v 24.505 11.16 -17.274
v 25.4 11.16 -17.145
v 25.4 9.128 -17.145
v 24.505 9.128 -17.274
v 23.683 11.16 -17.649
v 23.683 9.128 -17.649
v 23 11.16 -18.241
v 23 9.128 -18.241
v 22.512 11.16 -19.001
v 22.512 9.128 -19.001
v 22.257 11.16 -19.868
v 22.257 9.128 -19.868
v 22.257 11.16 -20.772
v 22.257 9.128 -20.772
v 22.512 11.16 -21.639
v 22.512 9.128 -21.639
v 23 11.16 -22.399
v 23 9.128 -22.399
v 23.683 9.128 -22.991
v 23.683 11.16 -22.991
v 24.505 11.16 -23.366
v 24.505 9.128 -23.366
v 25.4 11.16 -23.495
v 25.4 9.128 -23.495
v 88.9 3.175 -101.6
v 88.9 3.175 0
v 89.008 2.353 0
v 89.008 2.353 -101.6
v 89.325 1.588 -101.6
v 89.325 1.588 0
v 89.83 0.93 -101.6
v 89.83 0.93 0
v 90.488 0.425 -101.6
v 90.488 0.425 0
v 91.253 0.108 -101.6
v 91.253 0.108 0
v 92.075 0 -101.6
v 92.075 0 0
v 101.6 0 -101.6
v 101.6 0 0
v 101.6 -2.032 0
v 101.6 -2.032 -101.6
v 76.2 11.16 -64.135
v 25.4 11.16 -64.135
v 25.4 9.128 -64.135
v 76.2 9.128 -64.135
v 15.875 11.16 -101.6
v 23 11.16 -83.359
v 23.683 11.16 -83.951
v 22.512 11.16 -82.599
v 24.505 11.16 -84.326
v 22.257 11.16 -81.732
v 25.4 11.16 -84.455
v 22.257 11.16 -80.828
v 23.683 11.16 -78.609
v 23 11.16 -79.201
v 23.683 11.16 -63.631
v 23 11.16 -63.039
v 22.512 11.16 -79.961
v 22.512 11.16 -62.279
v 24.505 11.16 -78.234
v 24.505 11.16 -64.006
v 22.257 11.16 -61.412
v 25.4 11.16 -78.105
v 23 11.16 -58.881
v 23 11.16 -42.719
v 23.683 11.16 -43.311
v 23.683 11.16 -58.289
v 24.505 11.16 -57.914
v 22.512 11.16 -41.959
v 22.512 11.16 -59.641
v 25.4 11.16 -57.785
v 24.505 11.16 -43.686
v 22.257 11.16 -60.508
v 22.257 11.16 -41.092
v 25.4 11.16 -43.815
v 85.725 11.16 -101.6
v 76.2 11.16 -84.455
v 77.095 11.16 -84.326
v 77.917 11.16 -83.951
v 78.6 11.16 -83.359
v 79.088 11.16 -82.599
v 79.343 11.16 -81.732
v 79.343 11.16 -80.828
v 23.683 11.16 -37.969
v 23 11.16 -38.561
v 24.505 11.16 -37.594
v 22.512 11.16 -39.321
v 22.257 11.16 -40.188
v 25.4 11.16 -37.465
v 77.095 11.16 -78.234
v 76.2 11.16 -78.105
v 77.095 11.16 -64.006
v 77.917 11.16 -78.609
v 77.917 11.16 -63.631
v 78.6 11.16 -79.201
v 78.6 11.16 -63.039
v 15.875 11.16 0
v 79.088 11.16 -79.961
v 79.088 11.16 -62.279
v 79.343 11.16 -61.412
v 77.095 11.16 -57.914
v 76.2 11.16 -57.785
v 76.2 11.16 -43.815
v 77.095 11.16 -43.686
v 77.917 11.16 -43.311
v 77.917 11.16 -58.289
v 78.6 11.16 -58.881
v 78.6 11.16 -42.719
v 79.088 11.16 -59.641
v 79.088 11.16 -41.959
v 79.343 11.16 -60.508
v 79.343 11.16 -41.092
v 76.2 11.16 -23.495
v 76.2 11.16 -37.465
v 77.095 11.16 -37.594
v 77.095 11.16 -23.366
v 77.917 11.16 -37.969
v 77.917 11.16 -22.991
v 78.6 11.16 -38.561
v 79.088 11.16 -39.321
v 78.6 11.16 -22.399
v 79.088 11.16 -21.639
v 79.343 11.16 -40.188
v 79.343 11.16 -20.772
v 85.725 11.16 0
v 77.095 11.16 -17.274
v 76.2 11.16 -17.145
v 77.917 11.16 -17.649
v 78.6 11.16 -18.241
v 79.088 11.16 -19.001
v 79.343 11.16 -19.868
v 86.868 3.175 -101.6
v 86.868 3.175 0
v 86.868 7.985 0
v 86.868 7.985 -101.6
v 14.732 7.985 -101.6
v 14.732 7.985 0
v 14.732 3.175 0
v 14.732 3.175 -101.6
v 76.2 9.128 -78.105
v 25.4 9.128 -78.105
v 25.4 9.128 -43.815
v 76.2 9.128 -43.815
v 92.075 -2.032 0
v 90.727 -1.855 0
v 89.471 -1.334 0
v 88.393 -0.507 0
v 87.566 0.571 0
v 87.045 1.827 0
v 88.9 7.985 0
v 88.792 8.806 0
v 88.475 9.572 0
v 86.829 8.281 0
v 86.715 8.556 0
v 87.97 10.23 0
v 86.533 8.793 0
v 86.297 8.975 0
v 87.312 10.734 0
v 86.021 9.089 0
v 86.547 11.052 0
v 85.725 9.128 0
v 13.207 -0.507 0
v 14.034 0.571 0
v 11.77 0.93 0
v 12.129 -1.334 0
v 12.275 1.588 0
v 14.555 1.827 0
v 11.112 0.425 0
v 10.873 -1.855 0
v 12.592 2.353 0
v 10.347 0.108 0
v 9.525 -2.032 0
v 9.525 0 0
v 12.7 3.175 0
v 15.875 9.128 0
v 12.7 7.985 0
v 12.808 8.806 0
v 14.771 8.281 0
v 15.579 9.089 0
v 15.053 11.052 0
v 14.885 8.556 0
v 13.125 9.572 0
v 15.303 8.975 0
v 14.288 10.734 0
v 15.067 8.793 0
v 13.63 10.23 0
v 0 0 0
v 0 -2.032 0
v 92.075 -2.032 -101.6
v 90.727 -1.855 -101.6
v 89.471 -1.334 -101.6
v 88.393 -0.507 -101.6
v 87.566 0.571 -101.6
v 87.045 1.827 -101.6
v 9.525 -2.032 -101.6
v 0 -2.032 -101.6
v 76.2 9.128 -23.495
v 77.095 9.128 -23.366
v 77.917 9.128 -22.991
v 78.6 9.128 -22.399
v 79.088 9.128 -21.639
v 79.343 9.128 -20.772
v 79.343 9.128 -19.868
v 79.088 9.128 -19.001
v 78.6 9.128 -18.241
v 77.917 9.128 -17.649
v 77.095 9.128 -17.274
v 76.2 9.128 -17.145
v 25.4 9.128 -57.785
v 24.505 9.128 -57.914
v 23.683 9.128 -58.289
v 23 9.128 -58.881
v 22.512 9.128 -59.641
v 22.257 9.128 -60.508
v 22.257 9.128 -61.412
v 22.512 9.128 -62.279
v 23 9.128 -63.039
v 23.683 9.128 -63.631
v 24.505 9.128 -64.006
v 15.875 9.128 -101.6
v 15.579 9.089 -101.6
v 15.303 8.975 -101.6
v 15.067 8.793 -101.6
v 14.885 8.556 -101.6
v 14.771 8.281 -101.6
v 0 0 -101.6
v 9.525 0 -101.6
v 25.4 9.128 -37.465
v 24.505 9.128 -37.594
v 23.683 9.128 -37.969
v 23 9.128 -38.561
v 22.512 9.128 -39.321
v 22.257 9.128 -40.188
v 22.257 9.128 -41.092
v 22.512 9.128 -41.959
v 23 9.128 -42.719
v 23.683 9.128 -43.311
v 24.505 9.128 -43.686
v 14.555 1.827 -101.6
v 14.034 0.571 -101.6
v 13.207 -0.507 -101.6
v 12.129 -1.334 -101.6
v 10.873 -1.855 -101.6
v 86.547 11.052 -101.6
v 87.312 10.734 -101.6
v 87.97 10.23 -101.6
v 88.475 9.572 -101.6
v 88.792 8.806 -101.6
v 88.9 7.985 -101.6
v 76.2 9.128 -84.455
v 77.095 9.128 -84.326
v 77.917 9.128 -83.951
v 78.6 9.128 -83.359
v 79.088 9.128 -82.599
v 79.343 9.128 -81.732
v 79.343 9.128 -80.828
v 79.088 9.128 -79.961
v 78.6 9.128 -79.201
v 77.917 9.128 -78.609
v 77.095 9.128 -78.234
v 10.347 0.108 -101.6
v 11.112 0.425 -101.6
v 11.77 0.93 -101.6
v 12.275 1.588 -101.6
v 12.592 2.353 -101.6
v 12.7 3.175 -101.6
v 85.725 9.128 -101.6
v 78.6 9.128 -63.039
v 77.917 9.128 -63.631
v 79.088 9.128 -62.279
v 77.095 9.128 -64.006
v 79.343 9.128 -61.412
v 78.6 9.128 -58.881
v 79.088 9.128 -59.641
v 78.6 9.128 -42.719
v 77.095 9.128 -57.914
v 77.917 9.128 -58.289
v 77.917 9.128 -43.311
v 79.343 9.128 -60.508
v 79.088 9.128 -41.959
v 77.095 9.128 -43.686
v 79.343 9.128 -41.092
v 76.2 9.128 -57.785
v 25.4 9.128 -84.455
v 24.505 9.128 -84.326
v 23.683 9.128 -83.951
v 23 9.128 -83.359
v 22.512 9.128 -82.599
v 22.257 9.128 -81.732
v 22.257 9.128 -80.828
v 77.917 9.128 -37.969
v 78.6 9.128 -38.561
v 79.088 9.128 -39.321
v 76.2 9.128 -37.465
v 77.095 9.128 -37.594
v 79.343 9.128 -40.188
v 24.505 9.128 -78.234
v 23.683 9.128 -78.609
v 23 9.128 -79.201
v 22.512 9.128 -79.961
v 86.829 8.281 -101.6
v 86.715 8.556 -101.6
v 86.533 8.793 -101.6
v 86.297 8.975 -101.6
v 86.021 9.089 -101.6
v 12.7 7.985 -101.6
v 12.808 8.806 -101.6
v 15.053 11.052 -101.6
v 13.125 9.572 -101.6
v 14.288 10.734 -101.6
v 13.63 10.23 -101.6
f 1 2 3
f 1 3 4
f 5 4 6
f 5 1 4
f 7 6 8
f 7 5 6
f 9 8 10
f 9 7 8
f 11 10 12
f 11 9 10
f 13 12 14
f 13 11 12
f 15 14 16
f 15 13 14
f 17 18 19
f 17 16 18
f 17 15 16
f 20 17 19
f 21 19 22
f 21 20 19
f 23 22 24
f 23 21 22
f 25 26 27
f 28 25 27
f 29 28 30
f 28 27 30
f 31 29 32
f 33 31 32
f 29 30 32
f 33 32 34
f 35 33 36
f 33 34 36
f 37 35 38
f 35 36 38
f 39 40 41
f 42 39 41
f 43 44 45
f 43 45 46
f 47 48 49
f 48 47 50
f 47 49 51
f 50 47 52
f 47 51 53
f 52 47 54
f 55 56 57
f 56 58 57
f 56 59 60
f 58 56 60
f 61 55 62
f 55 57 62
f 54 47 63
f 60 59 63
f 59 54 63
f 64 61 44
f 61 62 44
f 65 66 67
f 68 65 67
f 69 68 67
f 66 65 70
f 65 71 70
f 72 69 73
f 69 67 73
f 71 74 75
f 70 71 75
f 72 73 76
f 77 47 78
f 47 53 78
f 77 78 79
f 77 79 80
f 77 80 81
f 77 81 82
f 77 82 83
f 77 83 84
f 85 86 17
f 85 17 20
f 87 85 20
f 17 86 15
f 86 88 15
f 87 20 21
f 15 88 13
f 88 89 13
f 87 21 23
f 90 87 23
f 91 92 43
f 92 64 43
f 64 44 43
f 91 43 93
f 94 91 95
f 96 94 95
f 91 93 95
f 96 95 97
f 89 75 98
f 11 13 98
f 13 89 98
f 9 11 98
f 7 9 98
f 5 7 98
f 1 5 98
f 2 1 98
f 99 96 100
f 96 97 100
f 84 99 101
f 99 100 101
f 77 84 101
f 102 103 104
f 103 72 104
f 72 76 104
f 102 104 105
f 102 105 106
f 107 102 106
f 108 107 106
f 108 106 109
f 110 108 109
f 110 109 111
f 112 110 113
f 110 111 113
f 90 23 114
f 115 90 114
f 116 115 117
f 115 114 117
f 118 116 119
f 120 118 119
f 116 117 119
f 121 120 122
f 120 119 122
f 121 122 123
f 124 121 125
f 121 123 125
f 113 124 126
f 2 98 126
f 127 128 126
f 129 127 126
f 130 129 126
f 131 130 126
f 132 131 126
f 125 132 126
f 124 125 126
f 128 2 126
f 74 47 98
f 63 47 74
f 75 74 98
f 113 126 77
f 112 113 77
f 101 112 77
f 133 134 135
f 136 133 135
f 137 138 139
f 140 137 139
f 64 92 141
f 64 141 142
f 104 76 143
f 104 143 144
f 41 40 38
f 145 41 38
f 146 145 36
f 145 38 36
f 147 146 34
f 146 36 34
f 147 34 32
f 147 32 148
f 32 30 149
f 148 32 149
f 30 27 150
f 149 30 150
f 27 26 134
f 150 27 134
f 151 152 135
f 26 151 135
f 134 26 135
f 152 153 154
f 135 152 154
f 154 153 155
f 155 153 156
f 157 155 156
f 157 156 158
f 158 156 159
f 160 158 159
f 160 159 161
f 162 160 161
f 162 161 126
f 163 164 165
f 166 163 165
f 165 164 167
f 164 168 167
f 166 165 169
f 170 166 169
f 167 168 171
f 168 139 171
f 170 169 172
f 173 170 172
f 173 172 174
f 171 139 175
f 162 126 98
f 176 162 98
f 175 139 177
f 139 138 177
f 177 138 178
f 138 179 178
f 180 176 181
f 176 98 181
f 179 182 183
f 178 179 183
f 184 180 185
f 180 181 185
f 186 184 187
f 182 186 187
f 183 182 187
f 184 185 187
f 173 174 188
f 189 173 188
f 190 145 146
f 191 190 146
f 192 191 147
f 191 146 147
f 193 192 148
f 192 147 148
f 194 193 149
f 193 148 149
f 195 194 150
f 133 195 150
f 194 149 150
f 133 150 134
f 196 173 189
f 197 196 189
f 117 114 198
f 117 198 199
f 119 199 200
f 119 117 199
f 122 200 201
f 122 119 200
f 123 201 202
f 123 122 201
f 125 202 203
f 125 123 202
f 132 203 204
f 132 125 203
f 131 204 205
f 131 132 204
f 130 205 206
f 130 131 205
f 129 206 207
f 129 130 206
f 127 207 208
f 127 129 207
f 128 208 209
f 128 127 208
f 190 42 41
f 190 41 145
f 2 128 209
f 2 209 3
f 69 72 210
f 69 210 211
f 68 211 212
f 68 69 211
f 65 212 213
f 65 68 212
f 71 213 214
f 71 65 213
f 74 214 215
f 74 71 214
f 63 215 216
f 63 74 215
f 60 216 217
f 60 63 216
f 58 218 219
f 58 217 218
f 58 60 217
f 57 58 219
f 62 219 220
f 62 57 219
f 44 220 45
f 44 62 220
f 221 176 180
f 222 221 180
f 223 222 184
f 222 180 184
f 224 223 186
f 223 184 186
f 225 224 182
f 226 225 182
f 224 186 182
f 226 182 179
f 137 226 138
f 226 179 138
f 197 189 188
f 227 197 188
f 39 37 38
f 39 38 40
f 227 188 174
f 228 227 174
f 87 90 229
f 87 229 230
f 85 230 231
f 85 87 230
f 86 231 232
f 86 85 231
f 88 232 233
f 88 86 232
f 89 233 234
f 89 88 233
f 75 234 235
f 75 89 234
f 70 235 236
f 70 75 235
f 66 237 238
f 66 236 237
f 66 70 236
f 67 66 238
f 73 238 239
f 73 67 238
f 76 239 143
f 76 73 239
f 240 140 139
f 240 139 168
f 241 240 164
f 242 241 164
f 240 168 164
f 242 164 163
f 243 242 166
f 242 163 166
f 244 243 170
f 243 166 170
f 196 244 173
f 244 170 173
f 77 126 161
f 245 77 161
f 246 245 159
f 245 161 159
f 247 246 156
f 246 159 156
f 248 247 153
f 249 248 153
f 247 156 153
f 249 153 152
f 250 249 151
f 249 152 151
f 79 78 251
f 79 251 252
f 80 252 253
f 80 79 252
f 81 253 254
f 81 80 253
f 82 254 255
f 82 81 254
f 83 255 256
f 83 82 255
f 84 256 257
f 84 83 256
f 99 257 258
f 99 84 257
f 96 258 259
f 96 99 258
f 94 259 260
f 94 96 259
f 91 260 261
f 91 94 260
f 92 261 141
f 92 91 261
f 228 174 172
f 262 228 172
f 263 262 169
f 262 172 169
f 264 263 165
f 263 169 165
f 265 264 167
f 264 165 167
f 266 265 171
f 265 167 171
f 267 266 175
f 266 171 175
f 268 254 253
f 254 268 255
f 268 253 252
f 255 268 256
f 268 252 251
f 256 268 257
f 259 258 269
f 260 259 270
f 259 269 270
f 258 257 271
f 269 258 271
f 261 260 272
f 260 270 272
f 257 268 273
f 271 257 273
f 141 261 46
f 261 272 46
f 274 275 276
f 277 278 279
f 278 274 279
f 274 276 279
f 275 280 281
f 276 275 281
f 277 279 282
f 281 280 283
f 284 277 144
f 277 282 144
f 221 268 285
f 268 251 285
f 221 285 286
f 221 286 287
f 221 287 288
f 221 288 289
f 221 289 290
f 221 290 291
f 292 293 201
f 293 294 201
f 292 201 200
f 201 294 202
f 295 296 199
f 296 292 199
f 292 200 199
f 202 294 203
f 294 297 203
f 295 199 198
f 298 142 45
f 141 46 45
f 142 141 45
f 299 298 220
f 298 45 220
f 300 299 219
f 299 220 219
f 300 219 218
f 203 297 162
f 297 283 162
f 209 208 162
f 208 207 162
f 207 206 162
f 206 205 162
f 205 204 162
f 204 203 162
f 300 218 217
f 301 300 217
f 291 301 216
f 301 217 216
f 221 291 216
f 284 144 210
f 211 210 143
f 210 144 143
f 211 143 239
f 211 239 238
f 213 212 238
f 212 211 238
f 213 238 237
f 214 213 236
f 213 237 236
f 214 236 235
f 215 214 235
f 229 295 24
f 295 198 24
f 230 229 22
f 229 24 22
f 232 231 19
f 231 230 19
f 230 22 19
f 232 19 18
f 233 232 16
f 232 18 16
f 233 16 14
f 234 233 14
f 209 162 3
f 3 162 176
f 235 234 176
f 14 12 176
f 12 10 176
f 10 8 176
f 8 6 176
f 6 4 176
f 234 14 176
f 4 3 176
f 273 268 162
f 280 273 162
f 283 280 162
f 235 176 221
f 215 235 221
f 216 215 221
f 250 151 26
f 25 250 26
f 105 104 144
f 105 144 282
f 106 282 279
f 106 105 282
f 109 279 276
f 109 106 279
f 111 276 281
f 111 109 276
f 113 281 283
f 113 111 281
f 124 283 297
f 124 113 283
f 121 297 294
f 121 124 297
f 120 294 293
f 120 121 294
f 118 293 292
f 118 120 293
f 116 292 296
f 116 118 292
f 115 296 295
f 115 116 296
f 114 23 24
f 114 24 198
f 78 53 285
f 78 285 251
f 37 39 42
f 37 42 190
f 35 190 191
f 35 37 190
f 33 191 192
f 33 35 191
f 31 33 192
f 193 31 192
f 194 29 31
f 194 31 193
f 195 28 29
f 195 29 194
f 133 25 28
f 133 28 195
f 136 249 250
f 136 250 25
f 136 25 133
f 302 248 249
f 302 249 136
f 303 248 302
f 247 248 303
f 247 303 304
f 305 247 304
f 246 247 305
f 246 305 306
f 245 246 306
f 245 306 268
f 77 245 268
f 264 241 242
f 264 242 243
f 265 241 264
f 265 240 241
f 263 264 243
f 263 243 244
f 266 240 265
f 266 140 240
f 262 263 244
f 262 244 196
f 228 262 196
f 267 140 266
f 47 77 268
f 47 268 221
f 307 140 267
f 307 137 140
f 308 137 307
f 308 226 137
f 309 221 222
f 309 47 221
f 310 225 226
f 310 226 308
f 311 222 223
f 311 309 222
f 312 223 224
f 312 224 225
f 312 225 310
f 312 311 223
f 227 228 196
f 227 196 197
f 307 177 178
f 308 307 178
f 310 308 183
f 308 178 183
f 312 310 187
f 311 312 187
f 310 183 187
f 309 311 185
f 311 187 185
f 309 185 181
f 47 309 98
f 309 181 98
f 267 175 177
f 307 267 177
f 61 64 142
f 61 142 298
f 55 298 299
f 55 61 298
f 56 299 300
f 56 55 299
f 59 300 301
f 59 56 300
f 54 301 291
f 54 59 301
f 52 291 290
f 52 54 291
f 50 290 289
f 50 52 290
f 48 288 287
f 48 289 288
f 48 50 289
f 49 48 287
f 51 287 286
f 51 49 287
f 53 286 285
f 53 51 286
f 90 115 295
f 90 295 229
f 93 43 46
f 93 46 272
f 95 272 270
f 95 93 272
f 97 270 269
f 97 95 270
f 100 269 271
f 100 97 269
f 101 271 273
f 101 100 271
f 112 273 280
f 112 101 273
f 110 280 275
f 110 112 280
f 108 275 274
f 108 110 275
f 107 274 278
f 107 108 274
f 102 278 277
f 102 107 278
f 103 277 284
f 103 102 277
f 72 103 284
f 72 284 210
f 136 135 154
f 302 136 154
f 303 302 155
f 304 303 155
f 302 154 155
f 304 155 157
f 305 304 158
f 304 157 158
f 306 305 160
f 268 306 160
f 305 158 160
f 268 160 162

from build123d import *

# Parameters (mm, degrees)
EXTRUDE_THIN1_DEPTH = 101.6
CUT_EXTRUDE1_DEPTH  = 49.784
LPATTERN1_COUNT     = 4
LPATTERN1_PITCH     = 20.32


with BuildPart() as part:
    # Sketch1 → Extrude-Thin1 (new body)
    with BuildSketch(Plane.XY):
        with BuildLine():
            Line((0, 0), (9.525, 0))
            ThreePointArc((9.525, 0), (11.77006403, 0.92993597), (12.7, 3.175))
            Line((12.7, 3.175), (12.7, 7.984742102))
            ThreePointArc((12.7, 7.984742102), (13.62993597, 10.229806132), (15.875, 11.159742102))
            Line((15.875, 11.159742102), (85.725, 11.159742102))
            ThreePointArc((85.725, 11.159742102), (87.97006403, 10.229806132), (88.9, 7.984742102))
            Line((88.9, 7.984742102), (88.9, 3.175))
            ThreePointArc((88.9, 3.175), (89.82993597, 0.92993597), (92.075, 0))
            Line((92.075, 0), (101.6, 0))
            Line((101.6, 0), (101.6, -2.032))
            Line((101.6, -2.032), (92.075, -2.032))
            ThreePointArc((92.075, -2.032), (88.39309499, -0.50690501), (86.868, 3.175))
            Line((86.868, 3.175), (86.868, 7.984742102))
            ThreePointArc((86.868, 7.984742102), (86.533223051, 8.792965153), (85.725, 9.127742102))
            Line((85.725, 9.127742102), (15.875, 9.127742102))
            ThreePointArc((15.875, 9.127742102), (15.066776949, 8.792965153), (14.732, 7.984742102))
            Line((14.732, 7.984742102), (14.732, 3.175))
            ThreePointArc((14.732, 3.175), (13.20690501, -0.50690501), (9.525, -2.032))
            Line((9.525, -2.032), (0, -2.032))
            Line((0, -2.032), (0, 0))
        make_face()
    extrude(amount=-EXTRUDE_THIN1_DEPTH)

    # Sketch2 → Cut-Extrude1 (cut, symmetric)
    with BuildSketch(Plane(origin=(0, 0, 0), x_dir=(1, 0, 0), z_dir=(0, 1, 0))):
        with BuildLine():
            Line((25.4, 23.495), (76.2, 23.495))
            ThreePointArc((76.2, 23.495), (79.375, 20.32), (76.2, 17.145))
            Line((76.2, 17.145), (25.4, 17.145))
            ThreePointArc((25.4, 17.145), (22.225, 20.32), (25.4, 23.495))
        make_face()
    cut_extrude1 = extrude(amount=CUT_EXTRUDE1_DEPTH, both=True, mode=Mode.SUBTRACT)

    # LPattern1: Cut-Extrude1 ×4
    with Locations(*[(0, 0, -i * LPATTERN1_PITCH) for i in range(1, LPATTERN1_COUNT)]):
        add(cut_extrude1, mode=Mode.SUBTRACT)


solid = part.part
